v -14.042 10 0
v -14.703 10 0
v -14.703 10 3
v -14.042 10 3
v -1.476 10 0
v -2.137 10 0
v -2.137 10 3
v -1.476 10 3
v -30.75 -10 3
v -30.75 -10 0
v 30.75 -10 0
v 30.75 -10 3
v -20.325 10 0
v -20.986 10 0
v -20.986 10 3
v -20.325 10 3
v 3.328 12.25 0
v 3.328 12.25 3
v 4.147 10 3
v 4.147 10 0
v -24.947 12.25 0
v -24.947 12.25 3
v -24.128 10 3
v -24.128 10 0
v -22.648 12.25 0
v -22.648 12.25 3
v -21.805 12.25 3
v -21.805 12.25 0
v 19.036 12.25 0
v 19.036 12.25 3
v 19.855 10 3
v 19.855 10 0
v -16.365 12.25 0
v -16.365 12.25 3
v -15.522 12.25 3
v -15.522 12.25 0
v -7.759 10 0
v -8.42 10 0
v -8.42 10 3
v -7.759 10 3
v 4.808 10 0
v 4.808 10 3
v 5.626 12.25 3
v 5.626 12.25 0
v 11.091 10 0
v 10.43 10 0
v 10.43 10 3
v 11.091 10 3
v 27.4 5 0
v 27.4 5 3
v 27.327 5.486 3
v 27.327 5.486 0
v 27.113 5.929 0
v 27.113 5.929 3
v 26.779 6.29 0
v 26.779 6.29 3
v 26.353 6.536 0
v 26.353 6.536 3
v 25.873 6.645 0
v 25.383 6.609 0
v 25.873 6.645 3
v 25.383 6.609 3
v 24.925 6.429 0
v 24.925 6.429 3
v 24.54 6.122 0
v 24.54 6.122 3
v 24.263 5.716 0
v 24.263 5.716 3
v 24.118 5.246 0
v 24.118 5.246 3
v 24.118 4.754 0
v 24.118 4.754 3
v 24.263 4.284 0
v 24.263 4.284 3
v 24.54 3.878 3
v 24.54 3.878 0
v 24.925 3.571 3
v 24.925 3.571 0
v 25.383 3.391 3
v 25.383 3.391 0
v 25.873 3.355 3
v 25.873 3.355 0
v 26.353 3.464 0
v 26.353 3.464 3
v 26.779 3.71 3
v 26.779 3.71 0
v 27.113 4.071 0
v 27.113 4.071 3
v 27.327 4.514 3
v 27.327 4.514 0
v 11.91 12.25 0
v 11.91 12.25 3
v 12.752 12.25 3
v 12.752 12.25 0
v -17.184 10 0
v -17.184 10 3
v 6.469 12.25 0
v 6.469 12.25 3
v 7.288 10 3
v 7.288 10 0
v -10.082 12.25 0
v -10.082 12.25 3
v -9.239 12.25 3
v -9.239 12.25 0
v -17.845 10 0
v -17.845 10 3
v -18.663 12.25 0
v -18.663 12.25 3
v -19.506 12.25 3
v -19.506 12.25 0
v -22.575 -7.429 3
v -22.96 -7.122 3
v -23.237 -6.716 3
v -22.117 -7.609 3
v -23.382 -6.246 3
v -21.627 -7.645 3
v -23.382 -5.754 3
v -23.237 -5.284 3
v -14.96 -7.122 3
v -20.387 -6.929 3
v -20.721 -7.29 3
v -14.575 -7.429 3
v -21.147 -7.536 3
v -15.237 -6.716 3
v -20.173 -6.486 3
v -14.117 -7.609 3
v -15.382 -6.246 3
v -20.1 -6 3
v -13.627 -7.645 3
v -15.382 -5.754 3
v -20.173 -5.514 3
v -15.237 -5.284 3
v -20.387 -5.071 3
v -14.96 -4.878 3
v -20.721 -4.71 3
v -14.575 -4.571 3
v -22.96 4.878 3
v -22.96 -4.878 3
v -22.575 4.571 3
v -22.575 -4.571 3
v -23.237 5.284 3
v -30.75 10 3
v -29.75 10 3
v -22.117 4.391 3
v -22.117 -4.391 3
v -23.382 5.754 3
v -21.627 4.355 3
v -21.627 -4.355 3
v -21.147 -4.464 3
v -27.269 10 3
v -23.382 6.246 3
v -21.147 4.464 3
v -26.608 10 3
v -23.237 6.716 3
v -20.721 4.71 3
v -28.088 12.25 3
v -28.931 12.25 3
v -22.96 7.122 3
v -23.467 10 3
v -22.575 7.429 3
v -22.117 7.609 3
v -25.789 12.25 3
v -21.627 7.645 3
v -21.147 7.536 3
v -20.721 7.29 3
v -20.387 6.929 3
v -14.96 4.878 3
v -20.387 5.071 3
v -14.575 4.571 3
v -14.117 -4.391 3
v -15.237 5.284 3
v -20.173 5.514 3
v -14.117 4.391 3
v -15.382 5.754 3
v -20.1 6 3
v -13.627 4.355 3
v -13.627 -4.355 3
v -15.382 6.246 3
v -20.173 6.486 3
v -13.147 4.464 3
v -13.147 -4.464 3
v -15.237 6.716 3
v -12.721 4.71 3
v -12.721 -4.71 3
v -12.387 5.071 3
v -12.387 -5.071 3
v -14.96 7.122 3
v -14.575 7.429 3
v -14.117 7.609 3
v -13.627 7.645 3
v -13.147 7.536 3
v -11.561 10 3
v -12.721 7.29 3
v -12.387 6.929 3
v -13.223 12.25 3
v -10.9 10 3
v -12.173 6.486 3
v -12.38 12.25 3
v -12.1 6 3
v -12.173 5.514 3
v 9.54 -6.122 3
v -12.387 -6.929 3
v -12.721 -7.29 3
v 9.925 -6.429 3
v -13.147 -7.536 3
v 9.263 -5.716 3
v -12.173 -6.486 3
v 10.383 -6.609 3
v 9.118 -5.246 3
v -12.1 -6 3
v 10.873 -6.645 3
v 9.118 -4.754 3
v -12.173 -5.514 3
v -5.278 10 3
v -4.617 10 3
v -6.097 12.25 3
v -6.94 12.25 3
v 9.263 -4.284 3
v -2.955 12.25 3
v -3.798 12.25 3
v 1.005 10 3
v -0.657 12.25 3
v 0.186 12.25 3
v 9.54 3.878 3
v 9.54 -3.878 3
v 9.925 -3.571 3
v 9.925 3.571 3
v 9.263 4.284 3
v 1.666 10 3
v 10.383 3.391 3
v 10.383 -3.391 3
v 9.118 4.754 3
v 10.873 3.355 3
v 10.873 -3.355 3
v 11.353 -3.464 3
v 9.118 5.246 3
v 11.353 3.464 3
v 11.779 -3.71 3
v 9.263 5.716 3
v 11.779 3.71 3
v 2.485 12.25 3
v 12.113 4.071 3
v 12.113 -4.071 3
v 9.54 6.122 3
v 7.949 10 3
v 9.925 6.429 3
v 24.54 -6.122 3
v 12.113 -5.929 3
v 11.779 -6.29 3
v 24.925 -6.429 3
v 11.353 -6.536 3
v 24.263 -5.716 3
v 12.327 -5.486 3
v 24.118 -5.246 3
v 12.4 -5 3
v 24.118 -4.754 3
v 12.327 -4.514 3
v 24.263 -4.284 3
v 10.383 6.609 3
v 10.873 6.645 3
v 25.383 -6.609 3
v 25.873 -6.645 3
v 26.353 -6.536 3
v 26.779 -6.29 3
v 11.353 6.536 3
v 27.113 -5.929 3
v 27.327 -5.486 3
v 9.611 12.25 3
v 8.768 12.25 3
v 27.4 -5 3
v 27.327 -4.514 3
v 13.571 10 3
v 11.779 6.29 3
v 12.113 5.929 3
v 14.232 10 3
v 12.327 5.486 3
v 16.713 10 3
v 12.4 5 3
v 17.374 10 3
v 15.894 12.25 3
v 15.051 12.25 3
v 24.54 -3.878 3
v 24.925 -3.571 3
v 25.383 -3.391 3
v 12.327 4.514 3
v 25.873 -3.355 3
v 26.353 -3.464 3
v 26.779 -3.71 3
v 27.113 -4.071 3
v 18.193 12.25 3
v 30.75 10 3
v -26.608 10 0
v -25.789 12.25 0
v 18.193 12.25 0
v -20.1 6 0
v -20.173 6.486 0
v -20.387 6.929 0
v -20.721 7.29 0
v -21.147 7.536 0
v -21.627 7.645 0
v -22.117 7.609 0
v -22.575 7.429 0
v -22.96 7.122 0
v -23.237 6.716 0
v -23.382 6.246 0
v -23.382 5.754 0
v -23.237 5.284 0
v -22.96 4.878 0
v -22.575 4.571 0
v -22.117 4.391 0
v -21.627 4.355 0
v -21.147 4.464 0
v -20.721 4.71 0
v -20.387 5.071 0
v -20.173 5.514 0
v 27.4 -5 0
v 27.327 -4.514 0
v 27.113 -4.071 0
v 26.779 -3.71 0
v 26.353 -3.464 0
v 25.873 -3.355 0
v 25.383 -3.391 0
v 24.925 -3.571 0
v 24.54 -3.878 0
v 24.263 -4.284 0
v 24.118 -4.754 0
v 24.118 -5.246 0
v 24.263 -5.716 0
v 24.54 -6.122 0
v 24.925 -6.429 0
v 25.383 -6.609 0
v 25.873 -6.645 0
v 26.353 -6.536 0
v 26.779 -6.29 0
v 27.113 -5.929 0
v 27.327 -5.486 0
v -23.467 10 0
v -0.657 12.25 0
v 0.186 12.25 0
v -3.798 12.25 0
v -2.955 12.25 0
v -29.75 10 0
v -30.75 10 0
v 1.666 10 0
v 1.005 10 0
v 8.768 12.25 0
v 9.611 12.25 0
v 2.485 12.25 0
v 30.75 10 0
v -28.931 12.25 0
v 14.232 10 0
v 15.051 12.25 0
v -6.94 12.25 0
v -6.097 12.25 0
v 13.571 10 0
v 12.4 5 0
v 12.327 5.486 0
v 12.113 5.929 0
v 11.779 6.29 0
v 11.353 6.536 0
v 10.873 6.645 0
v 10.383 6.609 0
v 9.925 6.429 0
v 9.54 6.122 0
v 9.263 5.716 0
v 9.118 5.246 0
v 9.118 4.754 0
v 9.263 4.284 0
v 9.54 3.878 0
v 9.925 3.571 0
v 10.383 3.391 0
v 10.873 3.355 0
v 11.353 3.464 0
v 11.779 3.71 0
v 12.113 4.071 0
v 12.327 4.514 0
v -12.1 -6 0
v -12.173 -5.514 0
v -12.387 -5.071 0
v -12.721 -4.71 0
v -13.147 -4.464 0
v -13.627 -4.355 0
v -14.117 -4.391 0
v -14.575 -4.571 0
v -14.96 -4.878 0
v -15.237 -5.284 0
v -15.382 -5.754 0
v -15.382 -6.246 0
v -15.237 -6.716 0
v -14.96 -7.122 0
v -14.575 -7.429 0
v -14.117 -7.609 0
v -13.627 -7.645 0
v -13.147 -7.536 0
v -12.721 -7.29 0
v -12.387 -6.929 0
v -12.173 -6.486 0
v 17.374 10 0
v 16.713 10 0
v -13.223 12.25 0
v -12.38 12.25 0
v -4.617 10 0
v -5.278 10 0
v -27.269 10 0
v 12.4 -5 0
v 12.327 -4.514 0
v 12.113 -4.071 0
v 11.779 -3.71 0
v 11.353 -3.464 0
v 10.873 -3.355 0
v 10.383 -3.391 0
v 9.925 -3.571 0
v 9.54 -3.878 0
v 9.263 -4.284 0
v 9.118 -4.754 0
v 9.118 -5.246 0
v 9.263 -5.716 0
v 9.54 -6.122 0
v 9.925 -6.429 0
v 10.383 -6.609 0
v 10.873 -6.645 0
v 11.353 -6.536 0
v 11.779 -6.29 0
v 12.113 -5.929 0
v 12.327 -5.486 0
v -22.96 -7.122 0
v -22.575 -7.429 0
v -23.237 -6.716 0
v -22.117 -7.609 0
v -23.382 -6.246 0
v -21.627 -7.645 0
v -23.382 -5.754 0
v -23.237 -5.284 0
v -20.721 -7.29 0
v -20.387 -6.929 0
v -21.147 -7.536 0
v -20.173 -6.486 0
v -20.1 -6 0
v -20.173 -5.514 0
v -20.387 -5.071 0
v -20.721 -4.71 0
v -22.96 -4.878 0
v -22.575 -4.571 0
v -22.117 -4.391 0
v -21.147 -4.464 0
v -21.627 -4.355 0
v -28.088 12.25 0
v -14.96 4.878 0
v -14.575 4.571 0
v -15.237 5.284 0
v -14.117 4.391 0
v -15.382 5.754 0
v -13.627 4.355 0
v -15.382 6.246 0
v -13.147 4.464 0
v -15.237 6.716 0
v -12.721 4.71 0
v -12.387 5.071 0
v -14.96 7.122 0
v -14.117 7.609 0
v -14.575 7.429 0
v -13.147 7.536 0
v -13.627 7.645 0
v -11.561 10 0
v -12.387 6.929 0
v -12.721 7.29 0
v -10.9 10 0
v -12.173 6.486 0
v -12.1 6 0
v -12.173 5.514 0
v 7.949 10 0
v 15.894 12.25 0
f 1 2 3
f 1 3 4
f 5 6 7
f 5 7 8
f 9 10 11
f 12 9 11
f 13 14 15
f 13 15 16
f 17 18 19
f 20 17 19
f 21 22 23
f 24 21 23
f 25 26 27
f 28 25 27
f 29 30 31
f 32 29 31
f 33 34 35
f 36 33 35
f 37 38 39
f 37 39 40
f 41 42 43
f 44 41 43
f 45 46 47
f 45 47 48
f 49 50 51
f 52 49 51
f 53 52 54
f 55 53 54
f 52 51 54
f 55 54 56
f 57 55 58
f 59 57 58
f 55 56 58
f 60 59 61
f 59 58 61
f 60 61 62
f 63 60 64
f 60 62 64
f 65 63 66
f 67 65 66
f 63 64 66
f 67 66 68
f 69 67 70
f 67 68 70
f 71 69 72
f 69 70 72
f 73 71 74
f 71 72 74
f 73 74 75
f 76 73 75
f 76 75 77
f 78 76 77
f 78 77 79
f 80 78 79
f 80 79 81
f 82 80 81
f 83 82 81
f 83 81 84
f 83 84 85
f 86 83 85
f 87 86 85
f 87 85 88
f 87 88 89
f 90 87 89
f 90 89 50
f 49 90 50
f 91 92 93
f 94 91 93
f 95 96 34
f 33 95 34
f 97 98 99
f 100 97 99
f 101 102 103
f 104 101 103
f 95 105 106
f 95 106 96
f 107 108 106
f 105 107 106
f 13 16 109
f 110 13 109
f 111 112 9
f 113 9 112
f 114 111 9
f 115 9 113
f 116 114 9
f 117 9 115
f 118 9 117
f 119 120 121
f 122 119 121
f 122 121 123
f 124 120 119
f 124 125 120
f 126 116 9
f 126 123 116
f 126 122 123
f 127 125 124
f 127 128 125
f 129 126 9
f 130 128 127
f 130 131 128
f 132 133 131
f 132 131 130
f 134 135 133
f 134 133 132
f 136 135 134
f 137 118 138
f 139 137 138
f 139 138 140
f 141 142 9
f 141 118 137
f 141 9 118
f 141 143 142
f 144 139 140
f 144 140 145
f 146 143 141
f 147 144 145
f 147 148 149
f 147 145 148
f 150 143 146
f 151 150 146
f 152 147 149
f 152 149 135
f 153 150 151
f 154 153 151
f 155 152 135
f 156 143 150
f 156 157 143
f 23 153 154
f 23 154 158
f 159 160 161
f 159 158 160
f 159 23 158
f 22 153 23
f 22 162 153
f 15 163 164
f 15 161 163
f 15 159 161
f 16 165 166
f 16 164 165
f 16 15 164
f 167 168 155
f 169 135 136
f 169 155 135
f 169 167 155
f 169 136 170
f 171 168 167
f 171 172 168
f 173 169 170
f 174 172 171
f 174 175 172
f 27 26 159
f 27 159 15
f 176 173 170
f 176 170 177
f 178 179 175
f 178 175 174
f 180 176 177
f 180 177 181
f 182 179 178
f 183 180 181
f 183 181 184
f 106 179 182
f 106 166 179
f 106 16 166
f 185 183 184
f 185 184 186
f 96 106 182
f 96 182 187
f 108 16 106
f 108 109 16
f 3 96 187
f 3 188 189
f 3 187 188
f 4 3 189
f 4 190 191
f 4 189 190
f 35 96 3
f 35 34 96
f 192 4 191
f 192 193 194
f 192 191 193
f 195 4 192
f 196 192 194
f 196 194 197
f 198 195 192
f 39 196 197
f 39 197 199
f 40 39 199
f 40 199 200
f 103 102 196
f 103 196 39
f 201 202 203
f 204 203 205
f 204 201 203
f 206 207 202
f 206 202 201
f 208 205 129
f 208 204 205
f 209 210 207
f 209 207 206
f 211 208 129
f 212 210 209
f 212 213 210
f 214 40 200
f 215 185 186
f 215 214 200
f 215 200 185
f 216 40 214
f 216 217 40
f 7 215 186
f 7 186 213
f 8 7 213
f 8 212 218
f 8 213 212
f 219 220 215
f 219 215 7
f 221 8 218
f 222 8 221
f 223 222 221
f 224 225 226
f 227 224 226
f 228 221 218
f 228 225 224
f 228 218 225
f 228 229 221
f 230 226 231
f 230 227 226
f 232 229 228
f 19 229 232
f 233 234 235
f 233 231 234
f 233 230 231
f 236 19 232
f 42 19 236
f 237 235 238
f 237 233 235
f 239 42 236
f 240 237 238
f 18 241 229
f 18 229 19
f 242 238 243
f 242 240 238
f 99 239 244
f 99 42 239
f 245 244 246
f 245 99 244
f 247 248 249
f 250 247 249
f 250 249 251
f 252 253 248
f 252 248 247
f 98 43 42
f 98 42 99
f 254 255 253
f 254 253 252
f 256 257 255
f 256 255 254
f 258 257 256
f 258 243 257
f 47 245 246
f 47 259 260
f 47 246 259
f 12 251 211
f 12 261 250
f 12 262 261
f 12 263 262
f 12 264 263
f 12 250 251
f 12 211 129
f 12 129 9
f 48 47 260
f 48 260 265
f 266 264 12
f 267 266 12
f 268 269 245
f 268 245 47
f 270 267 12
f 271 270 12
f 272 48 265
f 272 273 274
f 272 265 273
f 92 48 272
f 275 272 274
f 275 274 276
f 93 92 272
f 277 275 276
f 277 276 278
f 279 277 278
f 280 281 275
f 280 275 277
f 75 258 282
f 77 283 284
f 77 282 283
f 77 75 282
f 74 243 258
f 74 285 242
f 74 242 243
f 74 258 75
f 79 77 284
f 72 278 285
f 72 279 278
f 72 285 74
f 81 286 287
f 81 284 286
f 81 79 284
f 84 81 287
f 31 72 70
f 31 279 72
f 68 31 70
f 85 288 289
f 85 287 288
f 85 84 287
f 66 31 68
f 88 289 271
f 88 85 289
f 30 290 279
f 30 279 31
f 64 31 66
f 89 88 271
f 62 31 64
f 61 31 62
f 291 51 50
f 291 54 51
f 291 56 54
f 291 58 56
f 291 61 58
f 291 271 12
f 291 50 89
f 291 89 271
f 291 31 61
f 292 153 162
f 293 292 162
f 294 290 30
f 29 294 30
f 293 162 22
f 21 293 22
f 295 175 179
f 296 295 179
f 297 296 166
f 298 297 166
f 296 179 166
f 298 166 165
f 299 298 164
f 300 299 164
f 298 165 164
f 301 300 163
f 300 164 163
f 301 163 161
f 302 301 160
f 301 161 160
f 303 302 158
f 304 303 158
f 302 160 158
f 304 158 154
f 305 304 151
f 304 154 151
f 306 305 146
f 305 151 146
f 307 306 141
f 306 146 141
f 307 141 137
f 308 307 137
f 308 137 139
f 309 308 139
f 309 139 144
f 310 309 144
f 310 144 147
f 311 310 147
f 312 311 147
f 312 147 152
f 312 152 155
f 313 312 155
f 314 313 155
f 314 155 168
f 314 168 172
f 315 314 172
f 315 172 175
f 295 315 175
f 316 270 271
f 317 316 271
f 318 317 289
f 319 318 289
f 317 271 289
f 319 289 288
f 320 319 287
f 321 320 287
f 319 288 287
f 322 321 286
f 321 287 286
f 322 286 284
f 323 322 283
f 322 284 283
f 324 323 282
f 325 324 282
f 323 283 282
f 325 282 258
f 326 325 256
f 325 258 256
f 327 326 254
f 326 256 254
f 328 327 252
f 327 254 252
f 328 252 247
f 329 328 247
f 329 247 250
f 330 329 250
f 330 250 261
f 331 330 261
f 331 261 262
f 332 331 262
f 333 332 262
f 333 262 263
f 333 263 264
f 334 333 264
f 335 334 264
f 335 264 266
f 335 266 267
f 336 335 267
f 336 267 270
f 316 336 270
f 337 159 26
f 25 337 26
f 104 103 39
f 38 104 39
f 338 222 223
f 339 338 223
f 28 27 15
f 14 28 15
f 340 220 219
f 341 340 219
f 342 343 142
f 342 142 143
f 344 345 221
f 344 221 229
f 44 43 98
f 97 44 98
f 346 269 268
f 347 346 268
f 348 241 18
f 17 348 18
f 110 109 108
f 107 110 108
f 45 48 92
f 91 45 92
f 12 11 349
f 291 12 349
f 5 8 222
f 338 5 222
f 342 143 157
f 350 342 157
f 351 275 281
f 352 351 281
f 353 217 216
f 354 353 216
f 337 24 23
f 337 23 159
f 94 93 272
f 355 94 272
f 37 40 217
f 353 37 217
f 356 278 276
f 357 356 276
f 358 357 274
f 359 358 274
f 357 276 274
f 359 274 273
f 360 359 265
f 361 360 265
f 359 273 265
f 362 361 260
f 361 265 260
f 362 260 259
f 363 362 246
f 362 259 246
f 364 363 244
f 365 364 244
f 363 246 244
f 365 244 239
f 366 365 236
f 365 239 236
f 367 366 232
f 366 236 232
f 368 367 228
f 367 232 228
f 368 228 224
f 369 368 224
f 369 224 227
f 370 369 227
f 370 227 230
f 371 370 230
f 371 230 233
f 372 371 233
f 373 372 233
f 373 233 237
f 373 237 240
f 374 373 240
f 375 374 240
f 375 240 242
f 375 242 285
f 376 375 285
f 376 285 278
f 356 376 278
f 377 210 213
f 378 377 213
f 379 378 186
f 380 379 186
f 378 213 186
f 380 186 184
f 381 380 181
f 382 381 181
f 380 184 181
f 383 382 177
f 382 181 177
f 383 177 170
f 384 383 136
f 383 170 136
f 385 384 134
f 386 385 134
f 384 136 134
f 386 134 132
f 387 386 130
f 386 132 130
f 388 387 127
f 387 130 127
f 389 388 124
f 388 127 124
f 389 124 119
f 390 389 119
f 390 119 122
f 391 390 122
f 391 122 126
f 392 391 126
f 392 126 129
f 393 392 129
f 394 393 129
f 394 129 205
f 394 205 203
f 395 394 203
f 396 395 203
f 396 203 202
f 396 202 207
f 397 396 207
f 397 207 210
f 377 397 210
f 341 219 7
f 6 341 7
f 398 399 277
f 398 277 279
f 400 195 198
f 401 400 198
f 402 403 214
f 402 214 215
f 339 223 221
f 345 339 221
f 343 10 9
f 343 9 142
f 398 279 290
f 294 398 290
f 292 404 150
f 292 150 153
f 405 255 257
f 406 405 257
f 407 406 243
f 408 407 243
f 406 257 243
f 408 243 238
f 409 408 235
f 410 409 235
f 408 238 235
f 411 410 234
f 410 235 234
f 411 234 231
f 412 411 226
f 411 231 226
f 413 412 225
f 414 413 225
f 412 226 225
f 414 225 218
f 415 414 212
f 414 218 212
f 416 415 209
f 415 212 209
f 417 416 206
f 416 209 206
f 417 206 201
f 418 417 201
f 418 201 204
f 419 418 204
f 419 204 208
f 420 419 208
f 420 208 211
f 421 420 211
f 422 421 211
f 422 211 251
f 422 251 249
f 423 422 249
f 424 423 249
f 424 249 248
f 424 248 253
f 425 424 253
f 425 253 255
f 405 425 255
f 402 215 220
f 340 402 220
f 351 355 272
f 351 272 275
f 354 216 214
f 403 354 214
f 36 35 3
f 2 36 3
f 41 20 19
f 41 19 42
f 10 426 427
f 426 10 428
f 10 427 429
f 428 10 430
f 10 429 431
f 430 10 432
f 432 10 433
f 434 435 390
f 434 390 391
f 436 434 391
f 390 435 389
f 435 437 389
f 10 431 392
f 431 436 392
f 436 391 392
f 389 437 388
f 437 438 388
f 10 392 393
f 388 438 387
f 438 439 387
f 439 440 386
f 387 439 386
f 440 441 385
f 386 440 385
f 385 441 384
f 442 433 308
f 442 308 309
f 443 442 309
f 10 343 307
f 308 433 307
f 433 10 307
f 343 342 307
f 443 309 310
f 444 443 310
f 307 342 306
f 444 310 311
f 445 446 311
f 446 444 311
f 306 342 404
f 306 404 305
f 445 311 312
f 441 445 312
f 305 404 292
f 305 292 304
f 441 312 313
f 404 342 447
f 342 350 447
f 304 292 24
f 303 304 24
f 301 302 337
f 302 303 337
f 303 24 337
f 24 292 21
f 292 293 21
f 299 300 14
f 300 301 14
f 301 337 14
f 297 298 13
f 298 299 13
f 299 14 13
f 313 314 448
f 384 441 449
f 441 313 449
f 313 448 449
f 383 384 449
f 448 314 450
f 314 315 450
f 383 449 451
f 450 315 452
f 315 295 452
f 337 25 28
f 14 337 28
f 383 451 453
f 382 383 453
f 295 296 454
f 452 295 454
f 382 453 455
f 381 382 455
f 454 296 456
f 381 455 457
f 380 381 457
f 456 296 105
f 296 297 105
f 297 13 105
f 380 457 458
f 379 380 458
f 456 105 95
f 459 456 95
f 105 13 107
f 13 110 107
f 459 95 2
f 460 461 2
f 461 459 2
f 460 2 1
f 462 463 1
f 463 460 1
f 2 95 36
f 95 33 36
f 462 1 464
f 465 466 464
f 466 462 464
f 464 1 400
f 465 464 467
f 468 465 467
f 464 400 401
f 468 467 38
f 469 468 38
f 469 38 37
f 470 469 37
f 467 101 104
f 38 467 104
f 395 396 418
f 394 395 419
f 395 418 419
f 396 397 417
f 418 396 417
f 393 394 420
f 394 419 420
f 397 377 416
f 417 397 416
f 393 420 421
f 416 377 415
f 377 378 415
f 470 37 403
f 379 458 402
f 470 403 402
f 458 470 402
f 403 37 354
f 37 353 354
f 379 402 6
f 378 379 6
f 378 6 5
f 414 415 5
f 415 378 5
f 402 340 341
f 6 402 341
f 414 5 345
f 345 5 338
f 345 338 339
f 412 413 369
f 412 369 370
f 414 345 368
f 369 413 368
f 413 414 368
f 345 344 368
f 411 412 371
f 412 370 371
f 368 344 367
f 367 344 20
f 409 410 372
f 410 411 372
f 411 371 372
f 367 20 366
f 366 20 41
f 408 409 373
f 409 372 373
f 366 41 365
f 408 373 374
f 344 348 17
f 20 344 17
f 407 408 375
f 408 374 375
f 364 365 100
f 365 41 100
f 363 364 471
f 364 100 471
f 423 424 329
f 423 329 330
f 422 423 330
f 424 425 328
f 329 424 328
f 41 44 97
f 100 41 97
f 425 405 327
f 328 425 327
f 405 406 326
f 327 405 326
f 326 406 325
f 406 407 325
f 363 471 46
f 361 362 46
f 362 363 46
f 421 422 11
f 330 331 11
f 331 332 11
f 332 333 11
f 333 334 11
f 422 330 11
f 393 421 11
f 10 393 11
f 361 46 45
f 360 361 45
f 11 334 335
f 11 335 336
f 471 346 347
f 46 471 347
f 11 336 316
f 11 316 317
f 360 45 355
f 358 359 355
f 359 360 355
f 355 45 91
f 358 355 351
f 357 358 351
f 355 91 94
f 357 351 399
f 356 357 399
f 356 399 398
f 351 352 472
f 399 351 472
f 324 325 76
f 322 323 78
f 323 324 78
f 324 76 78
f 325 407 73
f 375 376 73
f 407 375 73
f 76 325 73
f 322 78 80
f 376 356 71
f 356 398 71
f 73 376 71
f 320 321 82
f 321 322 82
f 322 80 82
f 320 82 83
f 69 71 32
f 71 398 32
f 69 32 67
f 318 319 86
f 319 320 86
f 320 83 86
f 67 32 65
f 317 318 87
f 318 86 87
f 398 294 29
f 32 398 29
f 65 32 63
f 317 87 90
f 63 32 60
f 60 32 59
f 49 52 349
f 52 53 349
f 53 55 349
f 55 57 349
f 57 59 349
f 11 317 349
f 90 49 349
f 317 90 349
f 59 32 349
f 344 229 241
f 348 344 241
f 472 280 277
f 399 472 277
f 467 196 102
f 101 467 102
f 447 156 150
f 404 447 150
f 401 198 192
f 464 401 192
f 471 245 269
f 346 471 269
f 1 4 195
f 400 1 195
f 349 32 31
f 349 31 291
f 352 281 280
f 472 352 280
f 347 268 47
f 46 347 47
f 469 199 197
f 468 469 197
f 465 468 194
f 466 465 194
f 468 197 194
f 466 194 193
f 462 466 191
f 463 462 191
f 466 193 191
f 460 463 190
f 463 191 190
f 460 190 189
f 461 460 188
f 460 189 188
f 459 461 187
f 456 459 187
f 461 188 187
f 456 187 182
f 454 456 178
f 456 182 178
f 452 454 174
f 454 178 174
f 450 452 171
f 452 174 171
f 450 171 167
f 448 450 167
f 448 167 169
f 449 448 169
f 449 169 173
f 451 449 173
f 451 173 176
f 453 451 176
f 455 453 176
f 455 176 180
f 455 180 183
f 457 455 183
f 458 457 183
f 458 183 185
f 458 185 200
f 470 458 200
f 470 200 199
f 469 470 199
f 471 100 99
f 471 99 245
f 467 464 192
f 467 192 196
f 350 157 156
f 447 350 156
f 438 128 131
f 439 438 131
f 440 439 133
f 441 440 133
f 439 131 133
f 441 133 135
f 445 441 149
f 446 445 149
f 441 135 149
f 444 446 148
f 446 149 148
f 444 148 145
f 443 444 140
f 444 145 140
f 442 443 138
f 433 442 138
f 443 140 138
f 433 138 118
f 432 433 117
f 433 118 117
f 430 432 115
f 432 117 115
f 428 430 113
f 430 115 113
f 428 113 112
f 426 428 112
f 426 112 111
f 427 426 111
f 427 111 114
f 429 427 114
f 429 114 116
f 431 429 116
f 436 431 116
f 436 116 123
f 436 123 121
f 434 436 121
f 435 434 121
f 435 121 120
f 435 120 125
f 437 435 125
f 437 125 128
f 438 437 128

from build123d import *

# Parameters (mm, degrees)
SKETCH_1_W             = 61.5
SKETCH_1_H             = 20
EXTRUDE_1_DEPTH        = 3
EXTRUDE_2_DEPTH        = 3
PATTERN_LINEAR_1_COUNT = 16
PATTERN_LINEAR_1_PITCH = 3.141592654
CUT_EXTRUDE_1_REACH    = 35.236
SKETCH_3_R             = 1.65
CUT_EXTRUDE_2_REACH    = 35.236
SKETCH_4_R             = 1.65


with BuildPart() as part:
    # 草圖1 → 填料-伸長1 (new body)
    with BuildSketch(Plane.XY):
        Rectangle(SKETCH_1_W, SKETCH_1_H)
    extrude(amount=EXTRUDE_1_DEPTH)

    # 草圖2 → 填料-伸長2 (add)
    with BuildSketch(Plane.XY.offset(3)):
        Polygon((-29.75, 10), (-28.931066973, 12.25), (-28.088211111, 12.25), (-27.269278084, 10), align=None)
    extrude_2 = extrude(amount=-EXTRUDE_2_DEPTH)

    # 直線複製排列1: 填料-伸長2 ×16
    with Locations(*[(i * PATTERN_LINEAR_1_PITCH, 0, 0) for i in range(1, PATTERN_LINEAR_1_COUNT)]):
        add(extrude_2)

    # 草圖3 → 除料-伸長1 (cut, up to next)
    with BuildSketch(Plane.XY.offset(3), mode=Mode.PRIVATE) as cut_extrude_1_sk1:
        with Locations((-21.75, 6)):
            Circle(SKETCH_3_R)
    cut_extrude_1_tool1 = extrude(cut_extrude_1_sk1.sketch, amount=-CUT_EXTRUDE_1_REACH, mode=Mode.PRIVATE) & part.part
    # 草圖3 → 除料-伸長1 (cut, up to next)
    with BuildSketch(Plane.XY.offset(3), mode=Mode.PRIVATE) as cut_extrude_1_sk2:
        with Locations((-13.75, 6)):
            Circle(SKETCH_3_R)
    cut_extrude_1_tool2 = extrude(cut_extrude_1_sk2.sketch, amount=-CUT_EXTRUDE_1_REACH, mode=Mode.PRIVATE) & part.part
    # 草圖3 → 除料-伸長1 (cut, up to next)
    with BuildSketch(Plane.XY.offset(3), mode=Mode.PRIVATE) as cut_extrude_1_sk3:
        with Locations((-21.75, -6)):
            Circle(SKETCH_3_R)
    cut_extrude_1_tool3 = extrude(cut_extrude_1_sk3.sketch, amount=-CUT_EXTRUDE_1_REACH, mode=Mode.PRIVATE) & part.part
    # 草圖3 → 除料-伸長1 (cut, up to next)
    with BuildSketch(Plane.XY.offset(3), mode=Mode.PRIVATE) as cut_extrude_1_sk4:
        with Locations((-13.75, -6)):
            Circle(SKETCH_3_R)
    cut_extrude_1_tool4 = extrude(cut_extrude_1_sk4.sketch, amount=-CUT_EXTRUDE_1_REACH, mode=Mode.PRIVATE) & part.part
    add(cut_extrude_1_tool1.solids().sort_by_distance((-21.75, 6, 3))[0], mode=Mode.SUBTRACT)
    add(cut_extrude_1_tool2.solids().sort_by_distance((-13.75, 6, 3))[0], mode=Mode.SUBTRACT)
    add(cut_extrude_1_tool3.solids().sort_by_distance((-21.75, -6, 3))[0], mode=Mode.SUBTRACT)
    add(cut_extrude_1_tool4.solids().sort_by_distance((-13.75, -6, 3))[0], mode=Mode.SUBTRACT)

    # 草圖4 → 除料-伸長2 (cut, up to next)
    with BuildSketch(Plane.XY.offset(3), mode=Mode.PRIVATE) as cut_extrude_2_sk1:
        with Locations((25.75, 5)):
            Circle(SKETCH_4_R)
    cut_extrude_2_tool1 = extrude(cut_extrude_2_sk1.sketch, amount=-CUT_EXTRUDE_2_REACH, mode=Mode.PRIVATE) & part.part
    # 草圖4 → 除料-伸長2 (cut, up to next)
    with BuildSketch(Plane.XY.offset(3), mode=Mode.PRIVATE) as cut_extrude_2_sk2:
        with Locations((10.75, 5)):
            Circle(SKETCH_4_R)
    cut_extrude_2_tool2 = extrude(cut_extrude_2_sk2.sketch, amount=-CUT_EXTRUDE_2_REACH, mode=Mode.PRIVATE) & part.part
    # 草圖4 → 除料-伸長2 (cut, up to next)
    with BuildSketch(Plane.XY.offset(3), mode=Mode.PRIVATE) as cut_extrude_2_sk3:
        with Locations((25.75, -5)):
            Circle(SKETCH_4_R)
    cut_extrude_2_tool3 = extrude(cut_extrude_2_sk3.sketch, amount=-CUT_EXTRUDE_2_REACH, mode=Mode.PRIVATE) & part.part
    # 草圖4 → 除料-伸長2 (cut, up to next)
    with BuildSketch(Plane.XY.offset(3), mode=Mode.PRIVATE) as cut_extrude_2_sk4:
        with Locations((10.75, -5)):
            Circle(SKETCH_4_R)
    cut_extrude_2_tool4 = extrude(cut_extrude_2_sk4.sketch, amount=-CUT_EXTRUDE_2_REACH, mode=Mode.PRIVATE) & part.part
    add(cut_extrude_2_tool1.solids().sort_by_distance((25.75, 5, 3))[0], mode=Mode.SUBTRACT)
    add(cut_extrude_2_tool2.solids().sort_by_distance((10.75, 5, 3))[0], mode=Mode.SUBTRACT)
    add(cut_extrude_2_tool3.solids().sort_by_distance((25.75, -5, 3))[0], mode=Mode.SUBTRACT)
    add(cut_extrude_2_tool4.solids().sort_by_distance((10.75, -5, 3))[0], mode=Mode.SUBTRACT)


solid = part.part
